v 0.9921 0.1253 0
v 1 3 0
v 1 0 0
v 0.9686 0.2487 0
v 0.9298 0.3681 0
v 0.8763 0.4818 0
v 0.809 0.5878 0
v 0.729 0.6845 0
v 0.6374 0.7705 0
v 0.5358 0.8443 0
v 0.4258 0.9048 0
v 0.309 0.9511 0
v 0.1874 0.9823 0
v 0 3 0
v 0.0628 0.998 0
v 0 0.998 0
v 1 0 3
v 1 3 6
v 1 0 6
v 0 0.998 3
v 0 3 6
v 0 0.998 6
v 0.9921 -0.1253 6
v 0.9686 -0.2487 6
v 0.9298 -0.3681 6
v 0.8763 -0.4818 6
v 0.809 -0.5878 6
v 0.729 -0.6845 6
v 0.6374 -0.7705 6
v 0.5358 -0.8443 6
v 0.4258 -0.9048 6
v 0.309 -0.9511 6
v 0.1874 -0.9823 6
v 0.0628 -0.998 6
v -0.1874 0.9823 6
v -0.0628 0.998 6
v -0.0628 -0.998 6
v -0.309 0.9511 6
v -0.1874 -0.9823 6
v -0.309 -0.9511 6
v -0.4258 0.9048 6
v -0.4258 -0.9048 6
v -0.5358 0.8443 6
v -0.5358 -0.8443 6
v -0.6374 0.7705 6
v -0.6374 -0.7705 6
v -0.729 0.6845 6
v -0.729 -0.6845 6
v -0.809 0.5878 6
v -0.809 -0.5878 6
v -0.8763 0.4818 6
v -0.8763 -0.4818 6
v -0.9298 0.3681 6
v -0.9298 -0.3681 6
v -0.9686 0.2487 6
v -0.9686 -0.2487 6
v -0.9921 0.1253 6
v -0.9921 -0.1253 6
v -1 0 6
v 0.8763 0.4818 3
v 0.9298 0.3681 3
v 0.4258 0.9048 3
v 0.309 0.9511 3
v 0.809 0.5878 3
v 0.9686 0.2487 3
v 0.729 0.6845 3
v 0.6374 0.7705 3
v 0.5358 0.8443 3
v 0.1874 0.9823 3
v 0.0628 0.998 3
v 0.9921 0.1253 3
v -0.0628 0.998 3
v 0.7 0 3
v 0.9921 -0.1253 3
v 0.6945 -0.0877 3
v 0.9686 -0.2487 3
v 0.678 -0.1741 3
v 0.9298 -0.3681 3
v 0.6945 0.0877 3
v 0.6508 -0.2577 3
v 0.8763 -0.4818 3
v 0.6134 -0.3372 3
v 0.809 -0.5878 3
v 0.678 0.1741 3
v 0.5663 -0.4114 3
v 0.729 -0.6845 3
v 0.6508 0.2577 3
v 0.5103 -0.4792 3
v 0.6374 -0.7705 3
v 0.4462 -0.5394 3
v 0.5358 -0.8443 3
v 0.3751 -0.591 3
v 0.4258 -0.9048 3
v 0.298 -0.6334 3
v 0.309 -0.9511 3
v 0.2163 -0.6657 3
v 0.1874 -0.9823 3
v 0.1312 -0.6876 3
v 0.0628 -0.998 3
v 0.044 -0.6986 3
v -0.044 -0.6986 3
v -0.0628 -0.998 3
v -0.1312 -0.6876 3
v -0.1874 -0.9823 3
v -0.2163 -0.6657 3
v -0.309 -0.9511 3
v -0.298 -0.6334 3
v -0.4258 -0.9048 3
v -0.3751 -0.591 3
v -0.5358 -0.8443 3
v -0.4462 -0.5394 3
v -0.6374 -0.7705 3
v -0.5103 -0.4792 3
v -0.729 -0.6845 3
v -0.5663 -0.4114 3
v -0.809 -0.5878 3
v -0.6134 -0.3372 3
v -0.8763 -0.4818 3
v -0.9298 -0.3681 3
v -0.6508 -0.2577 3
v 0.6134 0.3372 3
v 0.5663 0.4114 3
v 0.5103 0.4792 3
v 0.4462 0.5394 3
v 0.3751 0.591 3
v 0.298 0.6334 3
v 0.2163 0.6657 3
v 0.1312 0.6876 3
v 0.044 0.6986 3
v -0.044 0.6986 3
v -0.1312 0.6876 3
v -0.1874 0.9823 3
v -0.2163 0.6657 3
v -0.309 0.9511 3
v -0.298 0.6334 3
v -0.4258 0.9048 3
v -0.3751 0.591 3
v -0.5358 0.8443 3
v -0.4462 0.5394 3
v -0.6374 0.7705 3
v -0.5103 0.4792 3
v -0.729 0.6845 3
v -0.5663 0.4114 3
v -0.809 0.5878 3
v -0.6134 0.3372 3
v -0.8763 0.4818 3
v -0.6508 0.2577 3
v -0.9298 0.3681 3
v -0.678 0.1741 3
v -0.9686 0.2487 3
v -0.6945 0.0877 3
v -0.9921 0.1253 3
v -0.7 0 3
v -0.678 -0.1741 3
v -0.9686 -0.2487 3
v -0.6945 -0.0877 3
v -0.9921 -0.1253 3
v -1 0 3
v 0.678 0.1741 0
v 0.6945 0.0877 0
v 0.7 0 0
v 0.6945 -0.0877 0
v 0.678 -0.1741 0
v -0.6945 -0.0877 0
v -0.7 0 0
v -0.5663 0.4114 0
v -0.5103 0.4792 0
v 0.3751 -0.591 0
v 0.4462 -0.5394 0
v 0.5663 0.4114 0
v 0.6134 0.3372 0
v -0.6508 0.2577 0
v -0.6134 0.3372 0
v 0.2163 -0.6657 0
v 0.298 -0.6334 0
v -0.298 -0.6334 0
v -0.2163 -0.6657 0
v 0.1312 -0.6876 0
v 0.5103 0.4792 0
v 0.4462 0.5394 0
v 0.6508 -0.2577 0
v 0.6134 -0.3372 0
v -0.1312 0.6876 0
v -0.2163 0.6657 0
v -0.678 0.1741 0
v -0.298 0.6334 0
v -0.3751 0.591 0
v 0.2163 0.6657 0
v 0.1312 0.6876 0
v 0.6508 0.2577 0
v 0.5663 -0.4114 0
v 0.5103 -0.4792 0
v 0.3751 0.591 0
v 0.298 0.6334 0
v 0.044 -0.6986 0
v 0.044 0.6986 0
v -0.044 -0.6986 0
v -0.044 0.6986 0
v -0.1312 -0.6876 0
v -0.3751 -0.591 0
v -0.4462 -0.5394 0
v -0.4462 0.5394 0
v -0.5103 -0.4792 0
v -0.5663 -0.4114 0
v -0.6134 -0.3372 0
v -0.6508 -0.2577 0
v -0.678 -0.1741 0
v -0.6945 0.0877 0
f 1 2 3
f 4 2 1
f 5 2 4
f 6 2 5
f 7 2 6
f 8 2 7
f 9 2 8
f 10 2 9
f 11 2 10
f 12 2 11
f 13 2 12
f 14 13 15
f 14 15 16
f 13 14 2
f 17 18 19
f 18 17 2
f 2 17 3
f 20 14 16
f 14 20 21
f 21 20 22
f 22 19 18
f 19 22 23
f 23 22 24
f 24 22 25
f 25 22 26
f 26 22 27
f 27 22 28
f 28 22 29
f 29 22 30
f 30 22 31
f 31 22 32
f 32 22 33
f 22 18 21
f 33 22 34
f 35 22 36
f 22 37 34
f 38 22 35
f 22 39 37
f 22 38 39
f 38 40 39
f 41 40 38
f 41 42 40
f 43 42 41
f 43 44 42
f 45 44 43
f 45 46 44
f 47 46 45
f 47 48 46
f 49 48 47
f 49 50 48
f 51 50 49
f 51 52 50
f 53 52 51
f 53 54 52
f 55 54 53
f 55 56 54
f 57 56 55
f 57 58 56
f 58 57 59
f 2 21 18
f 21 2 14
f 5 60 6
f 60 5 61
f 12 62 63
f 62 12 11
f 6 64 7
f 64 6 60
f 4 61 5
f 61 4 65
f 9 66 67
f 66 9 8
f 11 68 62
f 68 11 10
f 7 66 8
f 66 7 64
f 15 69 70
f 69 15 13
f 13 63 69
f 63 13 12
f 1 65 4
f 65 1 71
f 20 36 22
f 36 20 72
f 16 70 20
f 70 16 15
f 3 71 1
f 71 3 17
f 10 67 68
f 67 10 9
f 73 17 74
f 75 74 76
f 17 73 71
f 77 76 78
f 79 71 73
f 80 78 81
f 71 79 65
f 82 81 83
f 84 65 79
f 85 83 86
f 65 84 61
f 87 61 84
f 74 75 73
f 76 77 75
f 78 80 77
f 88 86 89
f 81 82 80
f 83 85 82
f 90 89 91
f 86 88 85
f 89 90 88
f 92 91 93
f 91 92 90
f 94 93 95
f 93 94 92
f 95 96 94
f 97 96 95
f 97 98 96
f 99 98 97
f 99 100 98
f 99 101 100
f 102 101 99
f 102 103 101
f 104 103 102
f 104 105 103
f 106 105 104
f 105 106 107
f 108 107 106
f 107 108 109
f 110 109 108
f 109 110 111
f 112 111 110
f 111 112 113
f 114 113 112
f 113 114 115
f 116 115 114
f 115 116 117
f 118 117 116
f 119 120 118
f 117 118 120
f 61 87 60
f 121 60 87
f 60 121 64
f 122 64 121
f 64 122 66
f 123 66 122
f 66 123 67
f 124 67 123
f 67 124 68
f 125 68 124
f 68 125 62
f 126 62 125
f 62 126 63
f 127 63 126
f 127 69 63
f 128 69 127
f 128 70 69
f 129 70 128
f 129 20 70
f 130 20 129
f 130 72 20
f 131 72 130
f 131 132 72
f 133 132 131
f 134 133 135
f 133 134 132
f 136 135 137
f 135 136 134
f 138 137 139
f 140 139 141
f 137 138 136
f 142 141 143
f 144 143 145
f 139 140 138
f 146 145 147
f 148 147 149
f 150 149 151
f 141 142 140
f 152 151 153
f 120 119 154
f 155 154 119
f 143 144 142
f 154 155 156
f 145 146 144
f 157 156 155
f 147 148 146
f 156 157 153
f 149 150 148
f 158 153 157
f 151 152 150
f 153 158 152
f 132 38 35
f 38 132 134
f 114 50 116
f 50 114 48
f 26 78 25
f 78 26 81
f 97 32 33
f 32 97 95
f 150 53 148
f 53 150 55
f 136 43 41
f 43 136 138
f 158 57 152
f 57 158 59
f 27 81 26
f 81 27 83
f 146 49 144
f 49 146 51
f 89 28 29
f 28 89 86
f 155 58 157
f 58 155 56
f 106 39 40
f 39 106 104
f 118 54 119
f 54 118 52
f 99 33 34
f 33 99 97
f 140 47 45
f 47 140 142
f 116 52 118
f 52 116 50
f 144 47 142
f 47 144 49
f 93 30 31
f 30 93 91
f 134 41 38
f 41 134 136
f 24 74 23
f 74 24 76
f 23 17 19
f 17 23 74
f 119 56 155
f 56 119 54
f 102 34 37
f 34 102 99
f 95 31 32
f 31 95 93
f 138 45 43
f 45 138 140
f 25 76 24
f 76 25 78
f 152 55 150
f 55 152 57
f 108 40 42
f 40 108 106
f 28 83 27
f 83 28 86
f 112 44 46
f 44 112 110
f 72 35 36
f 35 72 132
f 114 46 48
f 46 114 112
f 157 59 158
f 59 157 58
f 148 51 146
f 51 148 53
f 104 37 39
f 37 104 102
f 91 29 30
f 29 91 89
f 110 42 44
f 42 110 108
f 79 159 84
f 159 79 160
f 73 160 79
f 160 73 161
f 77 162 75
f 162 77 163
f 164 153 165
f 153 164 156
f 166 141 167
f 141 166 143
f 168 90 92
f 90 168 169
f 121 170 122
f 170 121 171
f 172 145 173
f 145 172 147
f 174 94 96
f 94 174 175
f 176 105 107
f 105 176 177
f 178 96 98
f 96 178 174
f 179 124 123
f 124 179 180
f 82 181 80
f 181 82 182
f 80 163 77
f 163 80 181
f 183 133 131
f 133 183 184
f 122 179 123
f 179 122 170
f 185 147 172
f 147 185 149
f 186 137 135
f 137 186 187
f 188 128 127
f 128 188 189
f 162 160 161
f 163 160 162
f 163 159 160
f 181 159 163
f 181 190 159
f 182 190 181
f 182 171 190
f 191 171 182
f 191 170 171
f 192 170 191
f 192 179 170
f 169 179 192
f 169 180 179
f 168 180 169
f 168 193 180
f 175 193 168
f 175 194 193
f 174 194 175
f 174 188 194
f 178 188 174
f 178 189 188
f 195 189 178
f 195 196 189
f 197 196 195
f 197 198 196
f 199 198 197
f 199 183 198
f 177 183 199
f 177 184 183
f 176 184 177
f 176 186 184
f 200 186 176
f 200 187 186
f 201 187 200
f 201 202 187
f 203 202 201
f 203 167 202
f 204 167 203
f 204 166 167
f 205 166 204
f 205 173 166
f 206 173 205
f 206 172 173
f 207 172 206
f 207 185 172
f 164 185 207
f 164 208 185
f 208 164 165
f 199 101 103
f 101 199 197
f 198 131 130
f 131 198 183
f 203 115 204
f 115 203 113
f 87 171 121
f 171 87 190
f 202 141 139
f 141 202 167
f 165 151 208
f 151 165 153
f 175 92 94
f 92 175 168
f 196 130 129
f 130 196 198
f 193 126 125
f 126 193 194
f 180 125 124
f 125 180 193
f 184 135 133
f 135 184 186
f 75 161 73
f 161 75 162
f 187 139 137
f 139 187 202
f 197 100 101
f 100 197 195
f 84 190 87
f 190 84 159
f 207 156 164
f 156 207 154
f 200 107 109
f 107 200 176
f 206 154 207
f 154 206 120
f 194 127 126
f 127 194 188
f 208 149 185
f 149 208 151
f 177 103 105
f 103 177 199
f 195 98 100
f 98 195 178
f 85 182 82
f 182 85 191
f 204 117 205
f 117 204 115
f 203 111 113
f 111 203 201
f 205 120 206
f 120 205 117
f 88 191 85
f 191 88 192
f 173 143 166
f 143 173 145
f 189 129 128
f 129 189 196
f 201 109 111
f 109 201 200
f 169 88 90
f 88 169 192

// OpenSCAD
module block() { //long block
	difference(){
		cube([6,3,1]);
		
	translate([-1,0,0])
		rotate([0,270,180])
			cylinder(h=8, r=1, $fn=50);
	}
}

module cylinder_bottom(){
	difference(){
		cylinder(h=3, r=1, $fn=50);

	translate([0,0,-1])
		cylinder(h=8, r=0.8, $fn=50);
	}

	rotate([0,270,180])
	block();
}

module cylinder_top(){

	translate([0,0,3])
		cylinder(h=3, r=1, $fn=50);
	cylinder(h=6, r=0.7, $fn=50);

	translate([0, 0, 6])
		rotate([0,90,0])
			block();
}

color("blue")
cylinder_top();

% cylinder_bottom();
